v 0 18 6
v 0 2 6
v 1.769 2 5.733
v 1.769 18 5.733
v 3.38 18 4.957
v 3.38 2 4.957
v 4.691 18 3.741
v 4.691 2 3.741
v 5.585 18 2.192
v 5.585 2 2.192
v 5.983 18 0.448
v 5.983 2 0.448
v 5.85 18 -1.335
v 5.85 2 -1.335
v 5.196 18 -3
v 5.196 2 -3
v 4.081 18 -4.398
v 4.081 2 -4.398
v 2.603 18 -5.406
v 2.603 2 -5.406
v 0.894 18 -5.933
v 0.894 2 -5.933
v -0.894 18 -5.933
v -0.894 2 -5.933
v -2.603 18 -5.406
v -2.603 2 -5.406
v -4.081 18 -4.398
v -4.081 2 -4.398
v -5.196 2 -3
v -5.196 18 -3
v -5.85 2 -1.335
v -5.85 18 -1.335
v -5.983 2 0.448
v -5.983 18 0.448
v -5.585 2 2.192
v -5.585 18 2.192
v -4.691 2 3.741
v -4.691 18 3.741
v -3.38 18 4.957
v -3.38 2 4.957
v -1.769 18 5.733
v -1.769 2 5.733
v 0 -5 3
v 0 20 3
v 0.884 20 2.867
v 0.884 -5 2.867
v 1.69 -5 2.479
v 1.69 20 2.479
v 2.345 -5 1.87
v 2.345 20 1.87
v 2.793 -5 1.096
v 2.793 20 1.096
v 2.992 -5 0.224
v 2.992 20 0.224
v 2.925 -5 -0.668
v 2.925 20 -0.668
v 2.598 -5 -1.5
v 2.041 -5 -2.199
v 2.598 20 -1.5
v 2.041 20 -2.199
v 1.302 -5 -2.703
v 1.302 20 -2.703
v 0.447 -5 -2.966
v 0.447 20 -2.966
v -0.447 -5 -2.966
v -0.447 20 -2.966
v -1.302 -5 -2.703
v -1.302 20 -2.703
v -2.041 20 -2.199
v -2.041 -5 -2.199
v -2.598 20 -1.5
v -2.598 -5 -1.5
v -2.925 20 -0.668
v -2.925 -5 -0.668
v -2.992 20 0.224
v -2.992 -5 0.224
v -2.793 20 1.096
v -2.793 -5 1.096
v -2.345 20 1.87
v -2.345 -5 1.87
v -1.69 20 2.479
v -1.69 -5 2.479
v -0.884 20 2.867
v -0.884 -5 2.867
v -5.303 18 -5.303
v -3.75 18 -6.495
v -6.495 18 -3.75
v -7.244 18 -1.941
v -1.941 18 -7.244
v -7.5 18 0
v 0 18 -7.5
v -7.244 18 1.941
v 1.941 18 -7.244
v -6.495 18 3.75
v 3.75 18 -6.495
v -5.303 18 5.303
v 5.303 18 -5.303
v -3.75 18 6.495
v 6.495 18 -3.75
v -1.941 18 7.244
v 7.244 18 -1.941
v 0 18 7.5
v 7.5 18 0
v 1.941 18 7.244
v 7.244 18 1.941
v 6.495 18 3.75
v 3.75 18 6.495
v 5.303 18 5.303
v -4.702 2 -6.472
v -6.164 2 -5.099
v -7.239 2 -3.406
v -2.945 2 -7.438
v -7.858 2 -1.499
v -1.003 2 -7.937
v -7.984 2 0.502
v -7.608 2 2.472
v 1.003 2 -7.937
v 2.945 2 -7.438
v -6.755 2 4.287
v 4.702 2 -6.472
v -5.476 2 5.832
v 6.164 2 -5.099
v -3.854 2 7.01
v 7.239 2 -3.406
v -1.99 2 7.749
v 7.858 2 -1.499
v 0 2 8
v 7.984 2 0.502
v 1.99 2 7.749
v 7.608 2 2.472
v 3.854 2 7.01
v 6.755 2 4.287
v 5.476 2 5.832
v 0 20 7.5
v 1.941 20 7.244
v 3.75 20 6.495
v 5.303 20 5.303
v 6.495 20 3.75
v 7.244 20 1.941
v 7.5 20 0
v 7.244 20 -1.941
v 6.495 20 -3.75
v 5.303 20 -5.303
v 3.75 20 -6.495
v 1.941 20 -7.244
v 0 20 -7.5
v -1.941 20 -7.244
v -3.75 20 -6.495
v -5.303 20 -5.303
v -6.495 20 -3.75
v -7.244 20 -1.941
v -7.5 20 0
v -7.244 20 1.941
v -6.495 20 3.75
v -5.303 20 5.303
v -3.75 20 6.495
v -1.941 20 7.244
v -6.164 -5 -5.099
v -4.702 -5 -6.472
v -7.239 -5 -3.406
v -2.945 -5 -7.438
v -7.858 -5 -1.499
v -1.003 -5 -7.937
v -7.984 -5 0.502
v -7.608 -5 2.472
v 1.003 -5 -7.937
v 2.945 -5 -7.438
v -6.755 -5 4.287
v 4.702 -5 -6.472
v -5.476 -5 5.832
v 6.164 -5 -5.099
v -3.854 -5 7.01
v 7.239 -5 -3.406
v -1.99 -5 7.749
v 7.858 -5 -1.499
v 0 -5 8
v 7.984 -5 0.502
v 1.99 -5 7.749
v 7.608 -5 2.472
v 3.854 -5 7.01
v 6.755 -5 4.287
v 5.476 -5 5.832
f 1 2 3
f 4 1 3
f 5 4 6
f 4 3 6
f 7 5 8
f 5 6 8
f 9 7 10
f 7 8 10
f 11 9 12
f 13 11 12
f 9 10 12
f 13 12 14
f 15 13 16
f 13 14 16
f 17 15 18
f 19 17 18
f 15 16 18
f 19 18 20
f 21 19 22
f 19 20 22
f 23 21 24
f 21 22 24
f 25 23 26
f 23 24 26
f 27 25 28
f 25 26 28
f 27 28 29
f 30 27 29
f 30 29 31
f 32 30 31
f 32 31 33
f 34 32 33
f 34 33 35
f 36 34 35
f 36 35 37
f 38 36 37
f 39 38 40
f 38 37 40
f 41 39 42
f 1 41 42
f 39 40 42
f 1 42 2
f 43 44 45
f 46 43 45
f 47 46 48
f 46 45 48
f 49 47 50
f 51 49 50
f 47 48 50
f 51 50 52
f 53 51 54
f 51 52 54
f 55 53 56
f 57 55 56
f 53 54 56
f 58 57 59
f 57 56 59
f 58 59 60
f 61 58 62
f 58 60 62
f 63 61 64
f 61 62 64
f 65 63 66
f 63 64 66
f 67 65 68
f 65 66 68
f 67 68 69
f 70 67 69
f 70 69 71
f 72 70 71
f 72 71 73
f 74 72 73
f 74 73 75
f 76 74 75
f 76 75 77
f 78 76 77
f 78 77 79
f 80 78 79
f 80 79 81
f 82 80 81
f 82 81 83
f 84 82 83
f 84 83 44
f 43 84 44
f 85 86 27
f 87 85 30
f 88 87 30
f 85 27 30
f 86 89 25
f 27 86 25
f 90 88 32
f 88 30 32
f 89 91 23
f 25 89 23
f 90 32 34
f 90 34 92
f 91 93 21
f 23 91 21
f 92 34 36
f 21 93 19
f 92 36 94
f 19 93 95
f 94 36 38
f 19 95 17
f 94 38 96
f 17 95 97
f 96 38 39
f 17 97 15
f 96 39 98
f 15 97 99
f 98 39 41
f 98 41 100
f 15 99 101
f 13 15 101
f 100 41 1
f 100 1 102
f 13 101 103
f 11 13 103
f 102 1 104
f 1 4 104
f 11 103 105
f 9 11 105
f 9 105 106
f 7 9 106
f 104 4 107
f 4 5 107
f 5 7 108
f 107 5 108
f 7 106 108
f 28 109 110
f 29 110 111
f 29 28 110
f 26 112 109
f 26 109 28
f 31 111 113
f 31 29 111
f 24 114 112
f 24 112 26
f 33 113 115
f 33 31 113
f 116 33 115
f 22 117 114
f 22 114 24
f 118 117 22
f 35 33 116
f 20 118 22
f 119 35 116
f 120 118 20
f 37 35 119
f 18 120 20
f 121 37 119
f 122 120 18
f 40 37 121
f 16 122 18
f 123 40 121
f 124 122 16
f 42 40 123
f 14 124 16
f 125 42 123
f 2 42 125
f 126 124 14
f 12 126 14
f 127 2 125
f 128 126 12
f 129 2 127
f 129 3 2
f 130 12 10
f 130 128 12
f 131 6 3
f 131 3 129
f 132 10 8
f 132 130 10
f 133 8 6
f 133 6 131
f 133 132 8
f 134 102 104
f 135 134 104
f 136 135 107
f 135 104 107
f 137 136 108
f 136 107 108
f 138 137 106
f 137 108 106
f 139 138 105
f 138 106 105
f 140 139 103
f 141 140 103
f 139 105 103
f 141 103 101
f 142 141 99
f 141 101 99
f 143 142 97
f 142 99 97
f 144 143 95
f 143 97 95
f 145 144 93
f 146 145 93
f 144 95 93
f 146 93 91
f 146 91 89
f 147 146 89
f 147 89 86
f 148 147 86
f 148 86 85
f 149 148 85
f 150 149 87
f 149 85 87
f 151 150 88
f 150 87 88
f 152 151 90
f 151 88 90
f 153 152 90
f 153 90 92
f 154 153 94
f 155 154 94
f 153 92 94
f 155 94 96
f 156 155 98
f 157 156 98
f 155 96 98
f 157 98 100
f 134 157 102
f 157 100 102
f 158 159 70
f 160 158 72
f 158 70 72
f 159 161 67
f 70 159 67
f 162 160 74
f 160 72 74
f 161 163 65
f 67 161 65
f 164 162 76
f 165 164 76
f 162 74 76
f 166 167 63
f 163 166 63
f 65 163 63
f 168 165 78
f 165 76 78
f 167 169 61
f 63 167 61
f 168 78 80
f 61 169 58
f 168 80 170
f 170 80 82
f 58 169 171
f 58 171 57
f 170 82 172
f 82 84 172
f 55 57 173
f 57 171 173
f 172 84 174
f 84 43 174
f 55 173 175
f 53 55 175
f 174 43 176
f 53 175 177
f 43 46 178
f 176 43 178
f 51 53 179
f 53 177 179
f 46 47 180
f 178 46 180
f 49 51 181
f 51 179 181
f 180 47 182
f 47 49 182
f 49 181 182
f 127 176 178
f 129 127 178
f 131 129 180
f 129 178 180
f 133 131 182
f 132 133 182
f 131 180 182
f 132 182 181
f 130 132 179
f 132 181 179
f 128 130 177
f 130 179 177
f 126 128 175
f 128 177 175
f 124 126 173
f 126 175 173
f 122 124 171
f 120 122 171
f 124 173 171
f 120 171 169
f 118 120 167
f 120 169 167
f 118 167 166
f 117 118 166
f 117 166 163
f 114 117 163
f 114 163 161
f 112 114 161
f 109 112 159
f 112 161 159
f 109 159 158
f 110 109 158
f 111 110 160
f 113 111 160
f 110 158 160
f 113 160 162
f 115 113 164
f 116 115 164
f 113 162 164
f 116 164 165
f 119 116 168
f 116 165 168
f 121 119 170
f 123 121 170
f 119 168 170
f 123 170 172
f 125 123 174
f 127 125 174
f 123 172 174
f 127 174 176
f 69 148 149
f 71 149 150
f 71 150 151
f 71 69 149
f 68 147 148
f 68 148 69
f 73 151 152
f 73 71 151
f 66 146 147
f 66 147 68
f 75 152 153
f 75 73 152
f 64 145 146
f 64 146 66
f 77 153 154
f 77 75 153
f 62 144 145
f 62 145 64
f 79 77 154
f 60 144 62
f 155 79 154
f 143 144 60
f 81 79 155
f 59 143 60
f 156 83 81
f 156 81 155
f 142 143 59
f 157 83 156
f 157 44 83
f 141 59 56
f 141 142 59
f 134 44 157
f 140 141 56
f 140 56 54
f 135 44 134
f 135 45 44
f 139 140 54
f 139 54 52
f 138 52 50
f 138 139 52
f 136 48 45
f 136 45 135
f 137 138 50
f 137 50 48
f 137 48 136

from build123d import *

# Parameters (mm, degrees)
EXTRUDE_1_DEPTH      = 2
EXTRUDE_1_DEPTH_BACK = 5
SKETCH_1_R           = 8
SKETCH_2_R           = 6
EXTRUDE_2_DEPTH      = 16
SKETCH_3_R           = 7.5
EXTRUDE_3_DEPTH      = 2
SKETCH_4_R           = 3
CUT_EXTRUDE_1_DEPTH  = 34


with BuildPart() as part:
    # 草图1 → 凸台-拉伸1 (new, two sides: drawn at the far end of the back side and taken through both)
    with BuildSketch(Plane(origin=(0, 0, 0), x_dir=(1, 0, 0), z_dir=(0, 1, 0)).offset(-EXTRUDE_1_DEPTH_BACK)):
        with Locations(Location((0, 0, 0), (0, 0, 270))):
            Circle(SKETCH_1_R)
    extrude(amount=EXTRUDE_1_DEPTH + EXTRUDE_1_DEPTH_BACK)

    # 草图2 → 凸台-拉伸2 (add)
    with BuildSketch(Plane(origin=(0, 2, 0), x_dir=(1, 0, 0), z_dir=(0, 1, 0))):
        with Locations(Location((0, 0, 0), (0, 0, 270))):
            Circle(SKETCH_2_R)
    extrude(amount=EXTRUDE_2_DEPTH)

    # 草图3 → 凸台-拉伸3 (add)
    with BuildSketch(Plane(origin=(0, 18, 0), x_dir=(1, 0, 0), z_dir=(0, 1, 0))):
        with Locations(Location((0, 0, 0), (0, 0, 270))):
            Circle(SKETCH_3_R)
    extrude(amount=EXTRUDE_3_DEPTH)

    # 草图4 → 切除-拉伸1 (cut)
    with BuildSketch(Plane(origin=(0, 20, 0), x_dir=(1, 0, 0), z_dir=(0, 1, 0))):
        with Locations(Location((0, 0, 0), (0, 0, 270))):
            Circle(SKETCH_4_R)
    extrude(amount=-CUT_EXTRUDE_1_DEPTH, mode=Mode.SUBTRACT)


solid = part.part
